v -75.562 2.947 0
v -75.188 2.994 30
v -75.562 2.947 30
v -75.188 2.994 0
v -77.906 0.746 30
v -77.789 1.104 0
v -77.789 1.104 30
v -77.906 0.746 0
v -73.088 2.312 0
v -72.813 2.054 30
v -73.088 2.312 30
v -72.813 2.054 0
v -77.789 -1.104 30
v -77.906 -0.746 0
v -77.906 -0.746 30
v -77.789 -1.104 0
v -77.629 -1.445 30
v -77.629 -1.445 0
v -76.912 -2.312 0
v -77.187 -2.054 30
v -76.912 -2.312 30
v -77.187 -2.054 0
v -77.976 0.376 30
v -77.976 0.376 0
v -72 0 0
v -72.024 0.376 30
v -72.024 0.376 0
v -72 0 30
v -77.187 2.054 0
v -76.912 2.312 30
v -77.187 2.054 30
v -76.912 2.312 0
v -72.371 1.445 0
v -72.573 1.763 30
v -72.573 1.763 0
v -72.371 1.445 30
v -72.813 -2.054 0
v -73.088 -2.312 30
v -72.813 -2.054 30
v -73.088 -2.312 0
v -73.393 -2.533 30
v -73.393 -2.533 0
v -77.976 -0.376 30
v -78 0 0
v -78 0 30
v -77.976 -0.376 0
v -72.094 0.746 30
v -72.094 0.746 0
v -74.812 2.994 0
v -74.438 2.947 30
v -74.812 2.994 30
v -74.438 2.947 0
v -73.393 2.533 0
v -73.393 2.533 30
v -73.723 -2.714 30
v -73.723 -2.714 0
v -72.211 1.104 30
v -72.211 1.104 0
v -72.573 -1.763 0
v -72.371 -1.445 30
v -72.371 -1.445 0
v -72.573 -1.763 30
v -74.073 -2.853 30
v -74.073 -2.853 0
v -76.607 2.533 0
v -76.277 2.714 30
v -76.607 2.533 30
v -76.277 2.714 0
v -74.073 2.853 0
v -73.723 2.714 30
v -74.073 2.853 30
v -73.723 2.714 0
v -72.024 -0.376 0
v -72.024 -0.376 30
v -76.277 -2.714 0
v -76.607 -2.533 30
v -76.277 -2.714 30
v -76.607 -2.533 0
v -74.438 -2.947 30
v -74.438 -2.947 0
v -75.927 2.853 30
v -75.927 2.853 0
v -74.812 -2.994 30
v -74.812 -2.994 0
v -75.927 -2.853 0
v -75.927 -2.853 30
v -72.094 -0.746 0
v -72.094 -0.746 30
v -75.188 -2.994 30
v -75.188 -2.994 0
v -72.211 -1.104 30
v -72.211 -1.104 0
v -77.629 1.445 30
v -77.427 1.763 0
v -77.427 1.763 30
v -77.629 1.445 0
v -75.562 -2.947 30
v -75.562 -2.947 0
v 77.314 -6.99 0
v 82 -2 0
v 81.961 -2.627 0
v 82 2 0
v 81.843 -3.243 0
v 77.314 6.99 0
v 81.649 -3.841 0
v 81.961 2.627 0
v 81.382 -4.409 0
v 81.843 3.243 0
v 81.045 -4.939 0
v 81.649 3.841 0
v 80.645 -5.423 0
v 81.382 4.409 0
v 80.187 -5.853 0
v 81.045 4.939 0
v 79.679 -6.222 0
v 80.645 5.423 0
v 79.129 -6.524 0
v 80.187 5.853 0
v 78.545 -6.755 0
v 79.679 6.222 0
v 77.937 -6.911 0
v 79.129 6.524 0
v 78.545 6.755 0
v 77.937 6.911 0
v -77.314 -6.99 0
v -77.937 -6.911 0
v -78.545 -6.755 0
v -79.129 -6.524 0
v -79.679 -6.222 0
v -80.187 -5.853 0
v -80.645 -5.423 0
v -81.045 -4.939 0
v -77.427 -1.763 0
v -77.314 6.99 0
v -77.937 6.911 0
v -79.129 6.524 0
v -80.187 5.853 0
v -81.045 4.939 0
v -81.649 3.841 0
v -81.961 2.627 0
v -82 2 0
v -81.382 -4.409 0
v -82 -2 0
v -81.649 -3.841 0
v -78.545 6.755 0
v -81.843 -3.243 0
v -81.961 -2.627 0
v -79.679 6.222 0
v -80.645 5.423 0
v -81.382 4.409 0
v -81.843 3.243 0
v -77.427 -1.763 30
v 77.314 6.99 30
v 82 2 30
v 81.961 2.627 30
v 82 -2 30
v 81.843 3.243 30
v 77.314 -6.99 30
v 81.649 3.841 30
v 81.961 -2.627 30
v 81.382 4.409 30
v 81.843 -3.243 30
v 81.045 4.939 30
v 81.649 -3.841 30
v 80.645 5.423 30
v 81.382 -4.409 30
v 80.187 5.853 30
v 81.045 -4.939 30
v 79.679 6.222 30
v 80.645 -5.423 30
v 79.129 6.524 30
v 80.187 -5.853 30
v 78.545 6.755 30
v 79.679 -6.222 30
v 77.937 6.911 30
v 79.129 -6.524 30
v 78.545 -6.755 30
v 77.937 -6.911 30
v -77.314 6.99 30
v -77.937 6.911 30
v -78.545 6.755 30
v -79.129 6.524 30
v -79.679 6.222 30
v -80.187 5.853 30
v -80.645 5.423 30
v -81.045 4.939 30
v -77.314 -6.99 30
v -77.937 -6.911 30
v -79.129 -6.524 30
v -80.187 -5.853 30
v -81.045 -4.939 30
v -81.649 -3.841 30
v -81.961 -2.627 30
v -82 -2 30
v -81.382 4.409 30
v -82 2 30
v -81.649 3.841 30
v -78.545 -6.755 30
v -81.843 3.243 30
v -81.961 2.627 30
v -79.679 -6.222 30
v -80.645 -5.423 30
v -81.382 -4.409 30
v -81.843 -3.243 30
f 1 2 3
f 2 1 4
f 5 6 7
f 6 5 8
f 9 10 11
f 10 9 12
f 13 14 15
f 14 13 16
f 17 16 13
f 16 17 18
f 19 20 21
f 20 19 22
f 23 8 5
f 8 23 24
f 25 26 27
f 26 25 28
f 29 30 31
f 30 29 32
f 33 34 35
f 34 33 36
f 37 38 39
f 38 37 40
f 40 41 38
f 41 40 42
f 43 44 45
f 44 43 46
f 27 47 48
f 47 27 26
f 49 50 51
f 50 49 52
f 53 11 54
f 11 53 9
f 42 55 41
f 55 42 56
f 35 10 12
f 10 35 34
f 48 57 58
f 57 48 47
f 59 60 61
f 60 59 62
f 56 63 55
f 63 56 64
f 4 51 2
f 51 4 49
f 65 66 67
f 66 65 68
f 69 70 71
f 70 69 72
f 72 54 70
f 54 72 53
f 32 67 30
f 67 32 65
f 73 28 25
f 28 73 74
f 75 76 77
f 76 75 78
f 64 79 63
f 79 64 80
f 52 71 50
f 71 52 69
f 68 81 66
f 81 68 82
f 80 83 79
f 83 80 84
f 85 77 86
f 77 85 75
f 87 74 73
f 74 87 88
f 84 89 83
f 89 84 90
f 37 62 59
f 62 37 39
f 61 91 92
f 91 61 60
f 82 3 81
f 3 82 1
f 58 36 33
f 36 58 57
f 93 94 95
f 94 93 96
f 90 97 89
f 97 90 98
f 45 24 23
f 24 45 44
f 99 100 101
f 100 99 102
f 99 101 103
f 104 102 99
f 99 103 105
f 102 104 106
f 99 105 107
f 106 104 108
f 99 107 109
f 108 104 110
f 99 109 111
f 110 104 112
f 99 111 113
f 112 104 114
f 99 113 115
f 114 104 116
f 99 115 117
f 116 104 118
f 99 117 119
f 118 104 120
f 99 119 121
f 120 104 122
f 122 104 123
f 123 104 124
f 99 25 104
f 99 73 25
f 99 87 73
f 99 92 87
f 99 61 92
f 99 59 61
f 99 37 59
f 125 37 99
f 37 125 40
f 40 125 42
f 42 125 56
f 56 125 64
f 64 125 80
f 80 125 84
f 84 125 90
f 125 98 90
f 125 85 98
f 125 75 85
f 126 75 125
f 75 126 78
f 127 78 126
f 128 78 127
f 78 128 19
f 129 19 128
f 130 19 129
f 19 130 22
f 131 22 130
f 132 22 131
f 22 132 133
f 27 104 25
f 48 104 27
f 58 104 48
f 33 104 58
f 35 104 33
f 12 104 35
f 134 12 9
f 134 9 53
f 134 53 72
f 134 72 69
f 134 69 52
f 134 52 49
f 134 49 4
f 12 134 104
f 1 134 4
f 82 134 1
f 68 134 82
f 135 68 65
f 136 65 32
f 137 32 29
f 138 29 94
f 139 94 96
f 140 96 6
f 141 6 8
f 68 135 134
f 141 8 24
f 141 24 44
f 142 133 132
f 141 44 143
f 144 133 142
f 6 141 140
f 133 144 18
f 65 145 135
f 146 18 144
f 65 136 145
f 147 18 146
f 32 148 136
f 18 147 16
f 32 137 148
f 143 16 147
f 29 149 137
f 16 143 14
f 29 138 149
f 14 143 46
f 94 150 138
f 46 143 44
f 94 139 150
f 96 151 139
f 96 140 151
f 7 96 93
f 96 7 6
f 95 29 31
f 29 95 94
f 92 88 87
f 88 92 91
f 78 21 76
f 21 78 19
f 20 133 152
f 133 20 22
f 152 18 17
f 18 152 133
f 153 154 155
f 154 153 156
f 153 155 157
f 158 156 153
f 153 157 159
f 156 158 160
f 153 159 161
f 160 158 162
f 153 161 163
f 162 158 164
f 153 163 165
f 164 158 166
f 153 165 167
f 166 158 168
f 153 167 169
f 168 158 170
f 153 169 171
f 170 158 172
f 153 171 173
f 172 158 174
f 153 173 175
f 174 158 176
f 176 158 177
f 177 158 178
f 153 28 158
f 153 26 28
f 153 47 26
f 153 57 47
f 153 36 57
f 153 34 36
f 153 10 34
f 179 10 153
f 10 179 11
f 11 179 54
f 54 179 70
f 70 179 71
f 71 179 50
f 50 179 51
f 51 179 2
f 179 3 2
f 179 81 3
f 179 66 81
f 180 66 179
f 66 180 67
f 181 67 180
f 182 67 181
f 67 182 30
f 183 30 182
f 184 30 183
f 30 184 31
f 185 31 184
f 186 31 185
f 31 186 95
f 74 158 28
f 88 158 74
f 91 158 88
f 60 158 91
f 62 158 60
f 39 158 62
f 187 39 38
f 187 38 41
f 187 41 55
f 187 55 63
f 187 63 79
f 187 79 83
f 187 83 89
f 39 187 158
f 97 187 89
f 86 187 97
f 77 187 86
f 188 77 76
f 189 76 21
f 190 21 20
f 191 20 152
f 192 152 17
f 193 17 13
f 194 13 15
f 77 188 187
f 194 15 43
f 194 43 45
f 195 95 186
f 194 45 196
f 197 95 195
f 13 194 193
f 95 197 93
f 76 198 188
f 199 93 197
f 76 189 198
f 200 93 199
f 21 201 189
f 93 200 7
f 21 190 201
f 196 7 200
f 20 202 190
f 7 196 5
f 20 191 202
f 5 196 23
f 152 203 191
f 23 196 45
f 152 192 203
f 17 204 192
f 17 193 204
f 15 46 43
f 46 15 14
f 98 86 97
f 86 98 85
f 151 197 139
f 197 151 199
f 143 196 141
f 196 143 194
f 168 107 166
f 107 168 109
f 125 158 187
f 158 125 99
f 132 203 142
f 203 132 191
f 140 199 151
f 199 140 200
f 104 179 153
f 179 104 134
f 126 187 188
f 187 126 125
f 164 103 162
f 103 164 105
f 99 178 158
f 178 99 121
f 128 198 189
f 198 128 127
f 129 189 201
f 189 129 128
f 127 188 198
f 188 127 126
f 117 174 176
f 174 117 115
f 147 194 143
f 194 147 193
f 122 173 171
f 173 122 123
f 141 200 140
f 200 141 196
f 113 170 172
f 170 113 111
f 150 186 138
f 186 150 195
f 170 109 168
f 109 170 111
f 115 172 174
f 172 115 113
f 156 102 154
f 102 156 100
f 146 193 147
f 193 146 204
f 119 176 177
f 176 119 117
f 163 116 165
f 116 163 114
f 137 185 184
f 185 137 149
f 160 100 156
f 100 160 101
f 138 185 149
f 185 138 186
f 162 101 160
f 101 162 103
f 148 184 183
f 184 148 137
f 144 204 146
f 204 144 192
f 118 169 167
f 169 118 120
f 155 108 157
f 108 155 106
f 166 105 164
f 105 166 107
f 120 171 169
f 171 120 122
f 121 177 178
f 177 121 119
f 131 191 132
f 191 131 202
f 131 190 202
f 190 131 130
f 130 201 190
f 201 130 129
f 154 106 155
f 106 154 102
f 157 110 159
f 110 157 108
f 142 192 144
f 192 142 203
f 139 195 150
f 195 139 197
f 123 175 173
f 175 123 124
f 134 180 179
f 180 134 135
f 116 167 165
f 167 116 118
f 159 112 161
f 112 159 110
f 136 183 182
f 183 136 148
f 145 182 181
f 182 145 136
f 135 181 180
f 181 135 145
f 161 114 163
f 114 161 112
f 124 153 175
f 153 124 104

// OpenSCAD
$fn = 50;


difference() {
	union() {
		hull() {
			translate(v = [-77.0000000000, 2.0000000000, 0]) {
				cylinder(h = 30, r = 5);
			}
			translate(v = [77.0000000000, 2.0000000000, 0]) {
				cylinder(h = 30, r = 5);
			}
			translate(v = [-77.0000000000, -2.0000000000, 0]) {
				cylinder(h = 30, r = 5);
			}
			translate(v = [77.0000000000, -2.0000000000, 0]) {
				cylinder(h = 30, r = 5);
			}
		}
	}
	union() {
		translate(v = [-75.0000000000, 0.0000000000, 0]) {
			cylinder(h = 30, r = 3.0000000000);
		}
		translate(v = [-75.0000000000, 0.0000000000, 0]) {
			cylinder(h = 30, r = 1.5000000000);
		}
		translate(v = [-75.0000000000, 0.0000000000, 0]) {
			cylinder(h = 30, r = 1.5000000000);
		}
		translate(v = [-75.0000000000, 0.0000000000, 0]) {
			cylinder(h = 30, r = 1.5000000000);
		}
	}
}
